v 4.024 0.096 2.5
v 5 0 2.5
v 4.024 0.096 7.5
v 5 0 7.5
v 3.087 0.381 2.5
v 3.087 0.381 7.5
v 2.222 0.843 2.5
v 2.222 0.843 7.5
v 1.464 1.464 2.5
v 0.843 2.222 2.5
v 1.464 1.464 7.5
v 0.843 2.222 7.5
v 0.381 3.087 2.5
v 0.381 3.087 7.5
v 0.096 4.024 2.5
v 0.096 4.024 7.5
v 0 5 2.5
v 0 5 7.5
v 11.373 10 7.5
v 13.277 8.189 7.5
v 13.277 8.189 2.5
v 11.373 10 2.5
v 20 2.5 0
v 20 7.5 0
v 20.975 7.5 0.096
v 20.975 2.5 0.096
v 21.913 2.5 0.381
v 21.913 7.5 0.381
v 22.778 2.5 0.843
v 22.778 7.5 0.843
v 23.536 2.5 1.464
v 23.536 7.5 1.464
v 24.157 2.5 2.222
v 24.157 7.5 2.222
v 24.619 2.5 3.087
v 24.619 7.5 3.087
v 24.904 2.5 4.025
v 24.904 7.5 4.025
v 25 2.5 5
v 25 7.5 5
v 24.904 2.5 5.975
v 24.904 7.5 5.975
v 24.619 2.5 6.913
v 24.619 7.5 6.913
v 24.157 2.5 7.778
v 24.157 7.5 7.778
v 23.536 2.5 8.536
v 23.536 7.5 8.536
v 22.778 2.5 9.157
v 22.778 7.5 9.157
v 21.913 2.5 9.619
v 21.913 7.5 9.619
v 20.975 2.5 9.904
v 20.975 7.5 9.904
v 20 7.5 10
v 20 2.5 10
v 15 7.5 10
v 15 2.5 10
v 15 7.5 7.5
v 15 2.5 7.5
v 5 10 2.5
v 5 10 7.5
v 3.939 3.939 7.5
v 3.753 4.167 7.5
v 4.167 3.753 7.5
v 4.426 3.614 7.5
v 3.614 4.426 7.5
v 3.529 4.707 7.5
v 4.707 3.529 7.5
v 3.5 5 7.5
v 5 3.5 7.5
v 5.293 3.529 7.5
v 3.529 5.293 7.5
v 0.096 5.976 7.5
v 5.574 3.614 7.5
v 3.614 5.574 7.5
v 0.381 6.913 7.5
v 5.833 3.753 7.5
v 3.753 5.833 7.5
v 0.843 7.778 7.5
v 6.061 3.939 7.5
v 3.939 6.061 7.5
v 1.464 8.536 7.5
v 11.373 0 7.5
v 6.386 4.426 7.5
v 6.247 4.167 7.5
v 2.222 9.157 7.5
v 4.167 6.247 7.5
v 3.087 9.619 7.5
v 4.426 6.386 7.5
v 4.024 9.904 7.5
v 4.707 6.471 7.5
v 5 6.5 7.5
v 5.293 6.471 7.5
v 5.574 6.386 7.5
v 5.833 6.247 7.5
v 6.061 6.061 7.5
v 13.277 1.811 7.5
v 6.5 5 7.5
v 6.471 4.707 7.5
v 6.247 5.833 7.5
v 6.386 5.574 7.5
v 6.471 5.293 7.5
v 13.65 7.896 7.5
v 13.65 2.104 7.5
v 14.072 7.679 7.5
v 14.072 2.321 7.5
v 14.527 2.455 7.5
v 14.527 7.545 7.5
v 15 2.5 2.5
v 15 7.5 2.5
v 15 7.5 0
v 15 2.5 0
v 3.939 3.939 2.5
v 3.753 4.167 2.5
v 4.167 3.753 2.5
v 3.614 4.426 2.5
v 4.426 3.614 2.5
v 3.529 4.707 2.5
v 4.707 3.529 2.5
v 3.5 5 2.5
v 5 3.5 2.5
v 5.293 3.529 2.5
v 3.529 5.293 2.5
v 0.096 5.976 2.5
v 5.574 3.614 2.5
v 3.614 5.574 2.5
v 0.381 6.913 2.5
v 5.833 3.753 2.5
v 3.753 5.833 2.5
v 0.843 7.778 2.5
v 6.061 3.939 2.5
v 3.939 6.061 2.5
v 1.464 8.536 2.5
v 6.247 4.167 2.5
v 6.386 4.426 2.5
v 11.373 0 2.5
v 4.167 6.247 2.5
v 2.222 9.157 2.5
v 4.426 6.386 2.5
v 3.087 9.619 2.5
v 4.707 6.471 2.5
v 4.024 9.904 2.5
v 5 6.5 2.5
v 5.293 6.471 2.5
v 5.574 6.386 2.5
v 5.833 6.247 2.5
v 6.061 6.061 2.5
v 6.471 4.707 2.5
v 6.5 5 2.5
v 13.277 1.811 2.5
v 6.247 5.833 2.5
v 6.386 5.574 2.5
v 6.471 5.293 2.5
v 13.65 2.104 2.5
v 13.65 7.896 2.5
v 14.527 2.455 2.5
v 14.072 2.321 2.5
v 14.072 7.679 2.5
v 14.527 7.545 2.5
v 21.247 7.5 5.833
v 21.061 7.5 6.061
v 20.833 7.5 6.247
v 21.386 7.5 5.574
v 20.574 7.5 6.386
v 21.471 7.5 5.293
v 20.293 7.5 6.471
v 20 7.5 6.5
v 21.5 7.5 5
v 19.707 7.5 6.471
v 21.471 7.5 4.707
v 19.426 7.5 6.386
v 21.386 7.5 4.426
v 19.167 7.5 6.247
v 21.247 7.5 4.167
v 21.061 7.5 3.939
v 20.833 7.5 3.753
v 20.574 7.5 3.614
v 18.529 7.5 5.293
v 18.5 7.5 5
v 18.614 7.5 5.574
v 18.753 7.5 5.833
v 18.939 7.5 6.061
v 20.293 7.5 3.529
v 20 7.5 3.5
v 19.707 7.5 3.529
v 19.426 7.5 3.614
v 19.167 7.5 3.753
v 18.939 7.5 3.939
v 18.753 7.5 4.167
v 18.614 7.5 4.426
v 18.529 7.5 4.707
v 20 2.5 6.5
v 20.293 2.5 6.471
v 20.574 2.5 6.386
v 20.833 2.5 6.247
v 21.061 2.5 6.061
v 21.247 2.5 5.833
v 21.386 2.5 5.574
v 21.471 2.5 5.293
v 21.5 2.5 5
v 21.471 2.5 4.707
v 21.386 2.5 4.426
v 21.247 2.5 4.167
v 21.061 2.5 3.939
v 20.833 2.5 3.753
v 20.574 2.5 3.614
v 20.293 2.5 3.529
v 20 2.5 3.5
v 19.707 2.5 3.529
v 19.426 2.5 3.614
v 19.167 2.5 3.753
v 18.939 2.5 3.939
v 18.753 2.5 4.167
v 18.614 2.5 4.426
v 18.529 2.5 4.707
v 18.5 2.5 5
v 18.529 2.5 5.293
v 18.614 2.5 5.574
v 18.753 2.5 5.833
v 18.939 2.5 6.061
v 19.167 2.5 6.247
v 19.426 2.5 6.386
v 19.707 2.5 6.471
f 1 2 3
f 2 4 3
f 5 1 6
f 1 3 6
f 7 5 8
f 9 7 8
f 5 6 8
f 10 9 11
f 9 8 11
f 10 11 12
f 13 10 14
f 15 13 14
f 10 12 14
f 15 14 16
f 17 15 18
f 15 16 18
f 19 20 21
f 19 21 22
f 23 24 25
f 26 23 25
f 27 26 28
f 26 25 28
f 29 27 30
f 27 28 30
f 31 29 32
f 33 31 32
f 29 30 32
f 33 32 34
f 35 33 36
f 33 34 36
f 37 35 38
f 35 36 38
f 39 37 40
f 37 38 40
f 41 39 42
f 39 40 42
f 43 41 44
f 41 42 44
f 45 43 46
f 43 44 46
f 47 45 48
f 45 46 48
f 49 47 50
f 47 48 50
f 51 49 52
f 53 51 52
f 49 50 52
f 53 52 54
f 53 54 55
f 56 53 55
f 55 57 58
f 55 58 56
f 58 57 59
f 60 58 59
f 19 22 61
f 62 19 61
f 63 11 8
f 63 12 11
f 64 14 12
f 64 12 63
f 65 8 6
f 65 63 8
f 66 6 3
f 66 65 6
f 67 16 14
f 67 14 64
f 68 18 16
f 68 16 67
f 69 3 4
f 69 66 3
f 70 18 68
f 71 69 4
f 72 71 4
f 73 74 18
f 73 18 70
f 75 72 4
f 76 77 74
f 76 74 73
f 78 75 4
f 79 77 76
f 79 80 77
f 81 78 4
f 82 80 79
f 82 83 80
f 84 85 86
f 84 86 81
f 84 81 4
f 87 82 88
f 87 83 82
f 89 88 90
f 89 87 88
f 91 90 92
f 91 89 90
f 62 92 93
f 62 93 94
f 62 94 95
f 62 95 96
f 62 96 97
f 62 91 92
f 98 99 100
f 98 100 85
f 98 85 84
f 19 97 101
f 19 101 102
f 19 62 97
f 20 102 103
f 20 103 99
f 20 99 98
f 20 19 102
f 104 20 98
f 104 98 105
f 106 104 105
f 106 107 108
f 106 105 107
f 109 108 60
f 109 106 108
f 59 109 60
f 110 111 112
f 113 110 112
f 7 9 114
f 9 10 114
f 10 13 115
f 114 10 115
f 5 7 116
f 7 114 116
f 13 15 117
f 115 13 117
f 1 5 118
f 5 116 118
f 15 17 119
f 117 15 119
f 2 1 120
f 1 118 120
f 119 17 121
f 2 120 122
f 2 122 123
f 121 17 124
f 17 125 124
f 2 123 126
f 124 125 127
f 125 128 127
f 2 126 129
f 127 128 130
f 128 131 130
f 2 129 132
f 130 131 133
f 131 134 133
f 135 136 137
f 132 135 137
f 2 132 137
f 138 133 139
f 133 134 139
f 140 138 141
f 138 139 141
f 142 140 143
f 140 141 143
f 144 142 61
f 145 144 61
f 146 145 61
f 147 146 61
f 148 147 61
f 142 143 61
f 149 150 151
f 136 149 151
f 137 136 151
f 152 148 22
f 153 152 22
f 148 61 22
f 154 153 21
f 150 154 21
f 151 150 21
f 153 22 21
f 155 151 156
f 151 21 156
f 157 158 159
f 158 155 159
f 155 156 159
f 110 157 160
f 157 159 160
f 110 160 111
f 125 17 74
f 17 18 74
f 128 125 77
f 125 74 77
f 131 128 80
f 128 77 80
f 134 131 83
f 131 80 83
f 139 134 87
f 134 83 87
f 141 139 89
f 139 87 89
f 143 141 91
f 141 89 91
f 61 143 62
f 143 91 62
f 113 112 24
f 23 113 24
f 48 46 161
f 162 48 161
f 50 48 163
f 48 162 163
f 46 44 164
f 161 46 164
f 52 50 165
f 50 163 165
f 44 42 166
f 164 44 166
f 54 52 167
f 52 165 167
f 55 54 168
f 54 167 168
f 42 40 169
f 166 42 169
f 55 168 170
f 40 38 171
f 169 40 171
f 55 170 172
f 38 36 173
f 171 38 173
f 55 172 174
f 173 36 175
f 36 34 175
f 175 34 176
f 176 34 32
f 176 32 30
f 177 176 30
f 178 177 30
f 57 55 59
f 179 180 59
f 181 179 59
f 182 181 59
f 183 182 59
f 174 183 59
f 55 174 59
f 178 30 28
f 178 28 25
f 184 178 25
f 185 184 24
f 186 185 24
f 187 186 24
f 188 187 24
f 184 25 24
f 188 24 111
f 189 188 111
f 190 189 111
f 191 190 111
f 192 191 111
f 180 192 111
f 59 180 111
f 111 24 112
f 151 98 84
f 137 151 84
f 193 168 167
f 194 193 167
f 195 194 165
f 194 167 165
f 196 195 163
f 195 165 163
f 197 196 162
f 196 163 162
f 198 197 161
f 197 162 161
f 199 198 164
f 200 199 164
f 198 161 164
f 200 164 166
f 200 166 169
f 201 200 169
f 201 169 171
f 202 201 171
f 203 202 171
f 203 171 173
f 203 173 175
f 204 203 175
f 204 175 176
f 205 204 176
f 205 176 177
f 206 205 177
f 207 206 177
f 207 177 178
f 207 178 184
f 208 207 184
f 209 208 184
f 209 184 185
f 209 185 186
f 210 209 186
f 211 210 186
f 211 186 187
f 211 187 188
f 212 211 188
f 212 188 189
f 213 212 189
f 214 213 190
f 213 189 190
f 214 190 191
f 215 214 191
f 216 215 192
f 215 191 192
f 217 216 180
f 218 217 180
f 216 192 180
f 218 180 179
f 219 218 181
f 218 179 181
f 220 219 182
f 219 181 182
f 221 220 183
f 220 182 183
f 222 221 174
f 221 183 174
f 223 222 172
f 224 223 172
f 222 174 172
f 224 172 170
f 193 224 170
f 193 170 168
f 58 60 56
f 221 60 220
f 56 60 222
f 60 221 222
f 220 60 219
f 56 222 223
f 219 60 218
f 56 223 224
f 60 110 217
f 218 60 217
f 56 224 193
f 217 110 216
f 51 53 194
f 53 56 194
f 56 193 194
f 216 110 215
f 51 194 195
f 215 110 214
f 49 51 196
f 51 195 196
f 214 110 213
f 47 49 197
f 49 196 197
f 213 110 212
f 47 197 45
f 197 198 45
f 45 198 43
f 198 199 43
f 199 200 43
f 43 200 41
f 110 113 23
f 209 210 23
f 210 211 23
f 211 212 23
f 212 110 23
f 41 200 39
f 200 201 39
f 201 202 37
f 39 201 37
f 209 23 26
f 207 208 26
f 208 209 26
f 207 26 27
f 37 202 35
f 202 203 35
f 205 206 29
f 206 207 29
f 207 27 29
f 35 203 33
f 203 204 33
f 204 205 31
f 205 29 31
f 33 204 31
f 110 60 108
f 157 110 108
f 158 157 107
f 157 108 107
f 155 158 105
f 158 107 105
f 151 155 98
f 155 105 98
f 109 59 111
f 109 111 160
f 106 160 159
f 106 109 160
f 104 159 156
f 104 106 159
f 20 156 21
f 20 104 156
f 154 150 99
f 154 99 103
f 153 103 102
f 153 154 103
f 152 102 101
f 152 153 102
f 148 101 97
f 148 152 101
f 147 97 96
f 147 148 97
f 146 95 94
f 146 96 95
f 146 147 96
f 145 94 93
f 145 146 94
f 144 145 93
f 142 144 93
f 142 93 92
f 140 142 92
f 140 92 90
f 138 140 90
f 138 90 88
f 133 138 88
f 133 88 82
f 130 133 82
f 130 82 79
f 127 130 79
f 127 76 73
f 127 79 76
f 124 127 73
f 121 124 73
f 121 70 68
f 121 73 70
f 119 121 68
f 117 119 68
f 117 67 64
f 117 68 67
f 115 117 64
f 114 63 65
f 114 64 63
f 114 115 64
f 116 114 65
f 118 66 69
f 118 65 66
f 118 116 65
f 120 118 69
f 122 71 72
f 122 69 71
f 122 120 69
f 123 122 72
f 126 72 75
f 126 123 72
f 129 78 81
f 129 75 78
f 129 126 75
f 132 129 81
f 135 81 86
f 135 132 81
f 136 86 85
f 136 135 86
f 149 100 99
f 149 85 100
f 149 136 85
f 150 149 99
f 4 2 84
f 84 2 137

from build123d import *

# Parameters (mm, degrees)
CROQUIS1_R              = 1.5
SALIENTE_EXTRUIR1_DEPTH = 10
CROQUIS2_R              = 1.5
CORTAR_EXTRUIR1_DEPTH   = 10
CROQUIS3_W              = 30
CROQUIS3_H              = 5.454139521
CORTAR_EXTRUIR2_DEPTH   = 10
REDONDEO1_R             = 5
CORTAR_EXTRUIR3_DEPTH   = 10


with BuildPart() as part:
    # Croquis1 → Saliente-Extruir1 (new body)
    with BuildSketch(Plane.XY):
        Polygon((0, 0), (15, 0), (15, 2.5), (25, 2.5), (25, 7.5), (15, 7.5), (15, 10), (0, 10), align=None)
        with Locations((5, 5)):
            Circle(CROQUIS1_R, mode=Mode.SUBTRACT)
    extrude(amount=SALIENTE_EXTRUIR1_DEPTH)

    # Croquis2 → Cortar-Extruir1 (cut)
    with BuildSketch(Plane(origin=(0, 7.5, 0), x_dir=(1, 0, 0), z_dir=(0, 1, 0))):
        with Locations(Location((20, -5, 0), (0, 0, 270))):
            Circle(CROQUIS2_R)
        with BuildLine():
            Line((20, -10), (20.922664414, -18.434540281))
            Line((20.922664414, -18.434540281), (42.481308924, -25.135304993))
            Line((42.481308924, -25.135304993), (36.797179784, -0.604681732))
            Line((36.797179784, -0.604681732), (34.226694382, 7.989532519))
            Line((34.226694382, 7.989532519), (20.461332207, 6.483723144))
            Line((20.461332207, 6.483723144), (20, 0))
            ThreePointArc((20, 0), (25, -5), (20, -10))
        make_face()
    extrude(amount=-CORTAR_EXTRUIR1_DEPTH, mode=Mode.SUBTRACT)

    # Croquis3 → Cortar-Extruir2 (cut)
    with BuildSketch(Plane(origin=(0, 10, 0), x_dir=(1, 0, 0), z_dir=(0, 1, 0))):
        with Locations((0, -10.227069761)):
            Rectangle(CROQUIS3_W, CROQUIS3_H)
        with Locations((0, 0.227069761)):
            Rectangle(CROQUIS3_W, CROQUIS3_H)
    extrude(amount=-CORTAR_EXTRUIR2_DEPTH, mode=Mode.SUBTRACT)

    # Redondeo1
    redondeo1_edges = [part.edges().sort_by_distance(p)[0] for p in [
        (0, 0, 5),
        (0, 10, 5),
    ]]
    fillet(redondeo1_edges, radius=REDONDEO1_R - 0.0001)  # a hair under: the kernel refuses the full size

    # Croquis4 → Cortar-Extruir3 (cut)
    with BuildSketch(Plane.XY.offset(7.5)):
        with BuildLine():
            Line((13.276608017, 8.188945039), (11.373430966, 10))
            Line((11.373430966, 10), (13.276608017, 11.811054961))
            ThreePointArc((13.276608017, 11.811054961), (17.5, 10), (13.276608017, 8.188945039))
        make_face()
        with BuildLine():
            Line((13.276608017, 1.811054961), (11.373430966, 0))
            Line((11.373430966, 0), (13.276608017, -1.811054961))
            ThreePointArc((13.276608017, -1.811054961), (17.5, 0), (13.276608017, 1.811054961))
        make_face()
    extrude(amount=-CORTAR_EXTRUIR3_DEPTH, mode=Mode.SUBTRACT)


solid = part.part
